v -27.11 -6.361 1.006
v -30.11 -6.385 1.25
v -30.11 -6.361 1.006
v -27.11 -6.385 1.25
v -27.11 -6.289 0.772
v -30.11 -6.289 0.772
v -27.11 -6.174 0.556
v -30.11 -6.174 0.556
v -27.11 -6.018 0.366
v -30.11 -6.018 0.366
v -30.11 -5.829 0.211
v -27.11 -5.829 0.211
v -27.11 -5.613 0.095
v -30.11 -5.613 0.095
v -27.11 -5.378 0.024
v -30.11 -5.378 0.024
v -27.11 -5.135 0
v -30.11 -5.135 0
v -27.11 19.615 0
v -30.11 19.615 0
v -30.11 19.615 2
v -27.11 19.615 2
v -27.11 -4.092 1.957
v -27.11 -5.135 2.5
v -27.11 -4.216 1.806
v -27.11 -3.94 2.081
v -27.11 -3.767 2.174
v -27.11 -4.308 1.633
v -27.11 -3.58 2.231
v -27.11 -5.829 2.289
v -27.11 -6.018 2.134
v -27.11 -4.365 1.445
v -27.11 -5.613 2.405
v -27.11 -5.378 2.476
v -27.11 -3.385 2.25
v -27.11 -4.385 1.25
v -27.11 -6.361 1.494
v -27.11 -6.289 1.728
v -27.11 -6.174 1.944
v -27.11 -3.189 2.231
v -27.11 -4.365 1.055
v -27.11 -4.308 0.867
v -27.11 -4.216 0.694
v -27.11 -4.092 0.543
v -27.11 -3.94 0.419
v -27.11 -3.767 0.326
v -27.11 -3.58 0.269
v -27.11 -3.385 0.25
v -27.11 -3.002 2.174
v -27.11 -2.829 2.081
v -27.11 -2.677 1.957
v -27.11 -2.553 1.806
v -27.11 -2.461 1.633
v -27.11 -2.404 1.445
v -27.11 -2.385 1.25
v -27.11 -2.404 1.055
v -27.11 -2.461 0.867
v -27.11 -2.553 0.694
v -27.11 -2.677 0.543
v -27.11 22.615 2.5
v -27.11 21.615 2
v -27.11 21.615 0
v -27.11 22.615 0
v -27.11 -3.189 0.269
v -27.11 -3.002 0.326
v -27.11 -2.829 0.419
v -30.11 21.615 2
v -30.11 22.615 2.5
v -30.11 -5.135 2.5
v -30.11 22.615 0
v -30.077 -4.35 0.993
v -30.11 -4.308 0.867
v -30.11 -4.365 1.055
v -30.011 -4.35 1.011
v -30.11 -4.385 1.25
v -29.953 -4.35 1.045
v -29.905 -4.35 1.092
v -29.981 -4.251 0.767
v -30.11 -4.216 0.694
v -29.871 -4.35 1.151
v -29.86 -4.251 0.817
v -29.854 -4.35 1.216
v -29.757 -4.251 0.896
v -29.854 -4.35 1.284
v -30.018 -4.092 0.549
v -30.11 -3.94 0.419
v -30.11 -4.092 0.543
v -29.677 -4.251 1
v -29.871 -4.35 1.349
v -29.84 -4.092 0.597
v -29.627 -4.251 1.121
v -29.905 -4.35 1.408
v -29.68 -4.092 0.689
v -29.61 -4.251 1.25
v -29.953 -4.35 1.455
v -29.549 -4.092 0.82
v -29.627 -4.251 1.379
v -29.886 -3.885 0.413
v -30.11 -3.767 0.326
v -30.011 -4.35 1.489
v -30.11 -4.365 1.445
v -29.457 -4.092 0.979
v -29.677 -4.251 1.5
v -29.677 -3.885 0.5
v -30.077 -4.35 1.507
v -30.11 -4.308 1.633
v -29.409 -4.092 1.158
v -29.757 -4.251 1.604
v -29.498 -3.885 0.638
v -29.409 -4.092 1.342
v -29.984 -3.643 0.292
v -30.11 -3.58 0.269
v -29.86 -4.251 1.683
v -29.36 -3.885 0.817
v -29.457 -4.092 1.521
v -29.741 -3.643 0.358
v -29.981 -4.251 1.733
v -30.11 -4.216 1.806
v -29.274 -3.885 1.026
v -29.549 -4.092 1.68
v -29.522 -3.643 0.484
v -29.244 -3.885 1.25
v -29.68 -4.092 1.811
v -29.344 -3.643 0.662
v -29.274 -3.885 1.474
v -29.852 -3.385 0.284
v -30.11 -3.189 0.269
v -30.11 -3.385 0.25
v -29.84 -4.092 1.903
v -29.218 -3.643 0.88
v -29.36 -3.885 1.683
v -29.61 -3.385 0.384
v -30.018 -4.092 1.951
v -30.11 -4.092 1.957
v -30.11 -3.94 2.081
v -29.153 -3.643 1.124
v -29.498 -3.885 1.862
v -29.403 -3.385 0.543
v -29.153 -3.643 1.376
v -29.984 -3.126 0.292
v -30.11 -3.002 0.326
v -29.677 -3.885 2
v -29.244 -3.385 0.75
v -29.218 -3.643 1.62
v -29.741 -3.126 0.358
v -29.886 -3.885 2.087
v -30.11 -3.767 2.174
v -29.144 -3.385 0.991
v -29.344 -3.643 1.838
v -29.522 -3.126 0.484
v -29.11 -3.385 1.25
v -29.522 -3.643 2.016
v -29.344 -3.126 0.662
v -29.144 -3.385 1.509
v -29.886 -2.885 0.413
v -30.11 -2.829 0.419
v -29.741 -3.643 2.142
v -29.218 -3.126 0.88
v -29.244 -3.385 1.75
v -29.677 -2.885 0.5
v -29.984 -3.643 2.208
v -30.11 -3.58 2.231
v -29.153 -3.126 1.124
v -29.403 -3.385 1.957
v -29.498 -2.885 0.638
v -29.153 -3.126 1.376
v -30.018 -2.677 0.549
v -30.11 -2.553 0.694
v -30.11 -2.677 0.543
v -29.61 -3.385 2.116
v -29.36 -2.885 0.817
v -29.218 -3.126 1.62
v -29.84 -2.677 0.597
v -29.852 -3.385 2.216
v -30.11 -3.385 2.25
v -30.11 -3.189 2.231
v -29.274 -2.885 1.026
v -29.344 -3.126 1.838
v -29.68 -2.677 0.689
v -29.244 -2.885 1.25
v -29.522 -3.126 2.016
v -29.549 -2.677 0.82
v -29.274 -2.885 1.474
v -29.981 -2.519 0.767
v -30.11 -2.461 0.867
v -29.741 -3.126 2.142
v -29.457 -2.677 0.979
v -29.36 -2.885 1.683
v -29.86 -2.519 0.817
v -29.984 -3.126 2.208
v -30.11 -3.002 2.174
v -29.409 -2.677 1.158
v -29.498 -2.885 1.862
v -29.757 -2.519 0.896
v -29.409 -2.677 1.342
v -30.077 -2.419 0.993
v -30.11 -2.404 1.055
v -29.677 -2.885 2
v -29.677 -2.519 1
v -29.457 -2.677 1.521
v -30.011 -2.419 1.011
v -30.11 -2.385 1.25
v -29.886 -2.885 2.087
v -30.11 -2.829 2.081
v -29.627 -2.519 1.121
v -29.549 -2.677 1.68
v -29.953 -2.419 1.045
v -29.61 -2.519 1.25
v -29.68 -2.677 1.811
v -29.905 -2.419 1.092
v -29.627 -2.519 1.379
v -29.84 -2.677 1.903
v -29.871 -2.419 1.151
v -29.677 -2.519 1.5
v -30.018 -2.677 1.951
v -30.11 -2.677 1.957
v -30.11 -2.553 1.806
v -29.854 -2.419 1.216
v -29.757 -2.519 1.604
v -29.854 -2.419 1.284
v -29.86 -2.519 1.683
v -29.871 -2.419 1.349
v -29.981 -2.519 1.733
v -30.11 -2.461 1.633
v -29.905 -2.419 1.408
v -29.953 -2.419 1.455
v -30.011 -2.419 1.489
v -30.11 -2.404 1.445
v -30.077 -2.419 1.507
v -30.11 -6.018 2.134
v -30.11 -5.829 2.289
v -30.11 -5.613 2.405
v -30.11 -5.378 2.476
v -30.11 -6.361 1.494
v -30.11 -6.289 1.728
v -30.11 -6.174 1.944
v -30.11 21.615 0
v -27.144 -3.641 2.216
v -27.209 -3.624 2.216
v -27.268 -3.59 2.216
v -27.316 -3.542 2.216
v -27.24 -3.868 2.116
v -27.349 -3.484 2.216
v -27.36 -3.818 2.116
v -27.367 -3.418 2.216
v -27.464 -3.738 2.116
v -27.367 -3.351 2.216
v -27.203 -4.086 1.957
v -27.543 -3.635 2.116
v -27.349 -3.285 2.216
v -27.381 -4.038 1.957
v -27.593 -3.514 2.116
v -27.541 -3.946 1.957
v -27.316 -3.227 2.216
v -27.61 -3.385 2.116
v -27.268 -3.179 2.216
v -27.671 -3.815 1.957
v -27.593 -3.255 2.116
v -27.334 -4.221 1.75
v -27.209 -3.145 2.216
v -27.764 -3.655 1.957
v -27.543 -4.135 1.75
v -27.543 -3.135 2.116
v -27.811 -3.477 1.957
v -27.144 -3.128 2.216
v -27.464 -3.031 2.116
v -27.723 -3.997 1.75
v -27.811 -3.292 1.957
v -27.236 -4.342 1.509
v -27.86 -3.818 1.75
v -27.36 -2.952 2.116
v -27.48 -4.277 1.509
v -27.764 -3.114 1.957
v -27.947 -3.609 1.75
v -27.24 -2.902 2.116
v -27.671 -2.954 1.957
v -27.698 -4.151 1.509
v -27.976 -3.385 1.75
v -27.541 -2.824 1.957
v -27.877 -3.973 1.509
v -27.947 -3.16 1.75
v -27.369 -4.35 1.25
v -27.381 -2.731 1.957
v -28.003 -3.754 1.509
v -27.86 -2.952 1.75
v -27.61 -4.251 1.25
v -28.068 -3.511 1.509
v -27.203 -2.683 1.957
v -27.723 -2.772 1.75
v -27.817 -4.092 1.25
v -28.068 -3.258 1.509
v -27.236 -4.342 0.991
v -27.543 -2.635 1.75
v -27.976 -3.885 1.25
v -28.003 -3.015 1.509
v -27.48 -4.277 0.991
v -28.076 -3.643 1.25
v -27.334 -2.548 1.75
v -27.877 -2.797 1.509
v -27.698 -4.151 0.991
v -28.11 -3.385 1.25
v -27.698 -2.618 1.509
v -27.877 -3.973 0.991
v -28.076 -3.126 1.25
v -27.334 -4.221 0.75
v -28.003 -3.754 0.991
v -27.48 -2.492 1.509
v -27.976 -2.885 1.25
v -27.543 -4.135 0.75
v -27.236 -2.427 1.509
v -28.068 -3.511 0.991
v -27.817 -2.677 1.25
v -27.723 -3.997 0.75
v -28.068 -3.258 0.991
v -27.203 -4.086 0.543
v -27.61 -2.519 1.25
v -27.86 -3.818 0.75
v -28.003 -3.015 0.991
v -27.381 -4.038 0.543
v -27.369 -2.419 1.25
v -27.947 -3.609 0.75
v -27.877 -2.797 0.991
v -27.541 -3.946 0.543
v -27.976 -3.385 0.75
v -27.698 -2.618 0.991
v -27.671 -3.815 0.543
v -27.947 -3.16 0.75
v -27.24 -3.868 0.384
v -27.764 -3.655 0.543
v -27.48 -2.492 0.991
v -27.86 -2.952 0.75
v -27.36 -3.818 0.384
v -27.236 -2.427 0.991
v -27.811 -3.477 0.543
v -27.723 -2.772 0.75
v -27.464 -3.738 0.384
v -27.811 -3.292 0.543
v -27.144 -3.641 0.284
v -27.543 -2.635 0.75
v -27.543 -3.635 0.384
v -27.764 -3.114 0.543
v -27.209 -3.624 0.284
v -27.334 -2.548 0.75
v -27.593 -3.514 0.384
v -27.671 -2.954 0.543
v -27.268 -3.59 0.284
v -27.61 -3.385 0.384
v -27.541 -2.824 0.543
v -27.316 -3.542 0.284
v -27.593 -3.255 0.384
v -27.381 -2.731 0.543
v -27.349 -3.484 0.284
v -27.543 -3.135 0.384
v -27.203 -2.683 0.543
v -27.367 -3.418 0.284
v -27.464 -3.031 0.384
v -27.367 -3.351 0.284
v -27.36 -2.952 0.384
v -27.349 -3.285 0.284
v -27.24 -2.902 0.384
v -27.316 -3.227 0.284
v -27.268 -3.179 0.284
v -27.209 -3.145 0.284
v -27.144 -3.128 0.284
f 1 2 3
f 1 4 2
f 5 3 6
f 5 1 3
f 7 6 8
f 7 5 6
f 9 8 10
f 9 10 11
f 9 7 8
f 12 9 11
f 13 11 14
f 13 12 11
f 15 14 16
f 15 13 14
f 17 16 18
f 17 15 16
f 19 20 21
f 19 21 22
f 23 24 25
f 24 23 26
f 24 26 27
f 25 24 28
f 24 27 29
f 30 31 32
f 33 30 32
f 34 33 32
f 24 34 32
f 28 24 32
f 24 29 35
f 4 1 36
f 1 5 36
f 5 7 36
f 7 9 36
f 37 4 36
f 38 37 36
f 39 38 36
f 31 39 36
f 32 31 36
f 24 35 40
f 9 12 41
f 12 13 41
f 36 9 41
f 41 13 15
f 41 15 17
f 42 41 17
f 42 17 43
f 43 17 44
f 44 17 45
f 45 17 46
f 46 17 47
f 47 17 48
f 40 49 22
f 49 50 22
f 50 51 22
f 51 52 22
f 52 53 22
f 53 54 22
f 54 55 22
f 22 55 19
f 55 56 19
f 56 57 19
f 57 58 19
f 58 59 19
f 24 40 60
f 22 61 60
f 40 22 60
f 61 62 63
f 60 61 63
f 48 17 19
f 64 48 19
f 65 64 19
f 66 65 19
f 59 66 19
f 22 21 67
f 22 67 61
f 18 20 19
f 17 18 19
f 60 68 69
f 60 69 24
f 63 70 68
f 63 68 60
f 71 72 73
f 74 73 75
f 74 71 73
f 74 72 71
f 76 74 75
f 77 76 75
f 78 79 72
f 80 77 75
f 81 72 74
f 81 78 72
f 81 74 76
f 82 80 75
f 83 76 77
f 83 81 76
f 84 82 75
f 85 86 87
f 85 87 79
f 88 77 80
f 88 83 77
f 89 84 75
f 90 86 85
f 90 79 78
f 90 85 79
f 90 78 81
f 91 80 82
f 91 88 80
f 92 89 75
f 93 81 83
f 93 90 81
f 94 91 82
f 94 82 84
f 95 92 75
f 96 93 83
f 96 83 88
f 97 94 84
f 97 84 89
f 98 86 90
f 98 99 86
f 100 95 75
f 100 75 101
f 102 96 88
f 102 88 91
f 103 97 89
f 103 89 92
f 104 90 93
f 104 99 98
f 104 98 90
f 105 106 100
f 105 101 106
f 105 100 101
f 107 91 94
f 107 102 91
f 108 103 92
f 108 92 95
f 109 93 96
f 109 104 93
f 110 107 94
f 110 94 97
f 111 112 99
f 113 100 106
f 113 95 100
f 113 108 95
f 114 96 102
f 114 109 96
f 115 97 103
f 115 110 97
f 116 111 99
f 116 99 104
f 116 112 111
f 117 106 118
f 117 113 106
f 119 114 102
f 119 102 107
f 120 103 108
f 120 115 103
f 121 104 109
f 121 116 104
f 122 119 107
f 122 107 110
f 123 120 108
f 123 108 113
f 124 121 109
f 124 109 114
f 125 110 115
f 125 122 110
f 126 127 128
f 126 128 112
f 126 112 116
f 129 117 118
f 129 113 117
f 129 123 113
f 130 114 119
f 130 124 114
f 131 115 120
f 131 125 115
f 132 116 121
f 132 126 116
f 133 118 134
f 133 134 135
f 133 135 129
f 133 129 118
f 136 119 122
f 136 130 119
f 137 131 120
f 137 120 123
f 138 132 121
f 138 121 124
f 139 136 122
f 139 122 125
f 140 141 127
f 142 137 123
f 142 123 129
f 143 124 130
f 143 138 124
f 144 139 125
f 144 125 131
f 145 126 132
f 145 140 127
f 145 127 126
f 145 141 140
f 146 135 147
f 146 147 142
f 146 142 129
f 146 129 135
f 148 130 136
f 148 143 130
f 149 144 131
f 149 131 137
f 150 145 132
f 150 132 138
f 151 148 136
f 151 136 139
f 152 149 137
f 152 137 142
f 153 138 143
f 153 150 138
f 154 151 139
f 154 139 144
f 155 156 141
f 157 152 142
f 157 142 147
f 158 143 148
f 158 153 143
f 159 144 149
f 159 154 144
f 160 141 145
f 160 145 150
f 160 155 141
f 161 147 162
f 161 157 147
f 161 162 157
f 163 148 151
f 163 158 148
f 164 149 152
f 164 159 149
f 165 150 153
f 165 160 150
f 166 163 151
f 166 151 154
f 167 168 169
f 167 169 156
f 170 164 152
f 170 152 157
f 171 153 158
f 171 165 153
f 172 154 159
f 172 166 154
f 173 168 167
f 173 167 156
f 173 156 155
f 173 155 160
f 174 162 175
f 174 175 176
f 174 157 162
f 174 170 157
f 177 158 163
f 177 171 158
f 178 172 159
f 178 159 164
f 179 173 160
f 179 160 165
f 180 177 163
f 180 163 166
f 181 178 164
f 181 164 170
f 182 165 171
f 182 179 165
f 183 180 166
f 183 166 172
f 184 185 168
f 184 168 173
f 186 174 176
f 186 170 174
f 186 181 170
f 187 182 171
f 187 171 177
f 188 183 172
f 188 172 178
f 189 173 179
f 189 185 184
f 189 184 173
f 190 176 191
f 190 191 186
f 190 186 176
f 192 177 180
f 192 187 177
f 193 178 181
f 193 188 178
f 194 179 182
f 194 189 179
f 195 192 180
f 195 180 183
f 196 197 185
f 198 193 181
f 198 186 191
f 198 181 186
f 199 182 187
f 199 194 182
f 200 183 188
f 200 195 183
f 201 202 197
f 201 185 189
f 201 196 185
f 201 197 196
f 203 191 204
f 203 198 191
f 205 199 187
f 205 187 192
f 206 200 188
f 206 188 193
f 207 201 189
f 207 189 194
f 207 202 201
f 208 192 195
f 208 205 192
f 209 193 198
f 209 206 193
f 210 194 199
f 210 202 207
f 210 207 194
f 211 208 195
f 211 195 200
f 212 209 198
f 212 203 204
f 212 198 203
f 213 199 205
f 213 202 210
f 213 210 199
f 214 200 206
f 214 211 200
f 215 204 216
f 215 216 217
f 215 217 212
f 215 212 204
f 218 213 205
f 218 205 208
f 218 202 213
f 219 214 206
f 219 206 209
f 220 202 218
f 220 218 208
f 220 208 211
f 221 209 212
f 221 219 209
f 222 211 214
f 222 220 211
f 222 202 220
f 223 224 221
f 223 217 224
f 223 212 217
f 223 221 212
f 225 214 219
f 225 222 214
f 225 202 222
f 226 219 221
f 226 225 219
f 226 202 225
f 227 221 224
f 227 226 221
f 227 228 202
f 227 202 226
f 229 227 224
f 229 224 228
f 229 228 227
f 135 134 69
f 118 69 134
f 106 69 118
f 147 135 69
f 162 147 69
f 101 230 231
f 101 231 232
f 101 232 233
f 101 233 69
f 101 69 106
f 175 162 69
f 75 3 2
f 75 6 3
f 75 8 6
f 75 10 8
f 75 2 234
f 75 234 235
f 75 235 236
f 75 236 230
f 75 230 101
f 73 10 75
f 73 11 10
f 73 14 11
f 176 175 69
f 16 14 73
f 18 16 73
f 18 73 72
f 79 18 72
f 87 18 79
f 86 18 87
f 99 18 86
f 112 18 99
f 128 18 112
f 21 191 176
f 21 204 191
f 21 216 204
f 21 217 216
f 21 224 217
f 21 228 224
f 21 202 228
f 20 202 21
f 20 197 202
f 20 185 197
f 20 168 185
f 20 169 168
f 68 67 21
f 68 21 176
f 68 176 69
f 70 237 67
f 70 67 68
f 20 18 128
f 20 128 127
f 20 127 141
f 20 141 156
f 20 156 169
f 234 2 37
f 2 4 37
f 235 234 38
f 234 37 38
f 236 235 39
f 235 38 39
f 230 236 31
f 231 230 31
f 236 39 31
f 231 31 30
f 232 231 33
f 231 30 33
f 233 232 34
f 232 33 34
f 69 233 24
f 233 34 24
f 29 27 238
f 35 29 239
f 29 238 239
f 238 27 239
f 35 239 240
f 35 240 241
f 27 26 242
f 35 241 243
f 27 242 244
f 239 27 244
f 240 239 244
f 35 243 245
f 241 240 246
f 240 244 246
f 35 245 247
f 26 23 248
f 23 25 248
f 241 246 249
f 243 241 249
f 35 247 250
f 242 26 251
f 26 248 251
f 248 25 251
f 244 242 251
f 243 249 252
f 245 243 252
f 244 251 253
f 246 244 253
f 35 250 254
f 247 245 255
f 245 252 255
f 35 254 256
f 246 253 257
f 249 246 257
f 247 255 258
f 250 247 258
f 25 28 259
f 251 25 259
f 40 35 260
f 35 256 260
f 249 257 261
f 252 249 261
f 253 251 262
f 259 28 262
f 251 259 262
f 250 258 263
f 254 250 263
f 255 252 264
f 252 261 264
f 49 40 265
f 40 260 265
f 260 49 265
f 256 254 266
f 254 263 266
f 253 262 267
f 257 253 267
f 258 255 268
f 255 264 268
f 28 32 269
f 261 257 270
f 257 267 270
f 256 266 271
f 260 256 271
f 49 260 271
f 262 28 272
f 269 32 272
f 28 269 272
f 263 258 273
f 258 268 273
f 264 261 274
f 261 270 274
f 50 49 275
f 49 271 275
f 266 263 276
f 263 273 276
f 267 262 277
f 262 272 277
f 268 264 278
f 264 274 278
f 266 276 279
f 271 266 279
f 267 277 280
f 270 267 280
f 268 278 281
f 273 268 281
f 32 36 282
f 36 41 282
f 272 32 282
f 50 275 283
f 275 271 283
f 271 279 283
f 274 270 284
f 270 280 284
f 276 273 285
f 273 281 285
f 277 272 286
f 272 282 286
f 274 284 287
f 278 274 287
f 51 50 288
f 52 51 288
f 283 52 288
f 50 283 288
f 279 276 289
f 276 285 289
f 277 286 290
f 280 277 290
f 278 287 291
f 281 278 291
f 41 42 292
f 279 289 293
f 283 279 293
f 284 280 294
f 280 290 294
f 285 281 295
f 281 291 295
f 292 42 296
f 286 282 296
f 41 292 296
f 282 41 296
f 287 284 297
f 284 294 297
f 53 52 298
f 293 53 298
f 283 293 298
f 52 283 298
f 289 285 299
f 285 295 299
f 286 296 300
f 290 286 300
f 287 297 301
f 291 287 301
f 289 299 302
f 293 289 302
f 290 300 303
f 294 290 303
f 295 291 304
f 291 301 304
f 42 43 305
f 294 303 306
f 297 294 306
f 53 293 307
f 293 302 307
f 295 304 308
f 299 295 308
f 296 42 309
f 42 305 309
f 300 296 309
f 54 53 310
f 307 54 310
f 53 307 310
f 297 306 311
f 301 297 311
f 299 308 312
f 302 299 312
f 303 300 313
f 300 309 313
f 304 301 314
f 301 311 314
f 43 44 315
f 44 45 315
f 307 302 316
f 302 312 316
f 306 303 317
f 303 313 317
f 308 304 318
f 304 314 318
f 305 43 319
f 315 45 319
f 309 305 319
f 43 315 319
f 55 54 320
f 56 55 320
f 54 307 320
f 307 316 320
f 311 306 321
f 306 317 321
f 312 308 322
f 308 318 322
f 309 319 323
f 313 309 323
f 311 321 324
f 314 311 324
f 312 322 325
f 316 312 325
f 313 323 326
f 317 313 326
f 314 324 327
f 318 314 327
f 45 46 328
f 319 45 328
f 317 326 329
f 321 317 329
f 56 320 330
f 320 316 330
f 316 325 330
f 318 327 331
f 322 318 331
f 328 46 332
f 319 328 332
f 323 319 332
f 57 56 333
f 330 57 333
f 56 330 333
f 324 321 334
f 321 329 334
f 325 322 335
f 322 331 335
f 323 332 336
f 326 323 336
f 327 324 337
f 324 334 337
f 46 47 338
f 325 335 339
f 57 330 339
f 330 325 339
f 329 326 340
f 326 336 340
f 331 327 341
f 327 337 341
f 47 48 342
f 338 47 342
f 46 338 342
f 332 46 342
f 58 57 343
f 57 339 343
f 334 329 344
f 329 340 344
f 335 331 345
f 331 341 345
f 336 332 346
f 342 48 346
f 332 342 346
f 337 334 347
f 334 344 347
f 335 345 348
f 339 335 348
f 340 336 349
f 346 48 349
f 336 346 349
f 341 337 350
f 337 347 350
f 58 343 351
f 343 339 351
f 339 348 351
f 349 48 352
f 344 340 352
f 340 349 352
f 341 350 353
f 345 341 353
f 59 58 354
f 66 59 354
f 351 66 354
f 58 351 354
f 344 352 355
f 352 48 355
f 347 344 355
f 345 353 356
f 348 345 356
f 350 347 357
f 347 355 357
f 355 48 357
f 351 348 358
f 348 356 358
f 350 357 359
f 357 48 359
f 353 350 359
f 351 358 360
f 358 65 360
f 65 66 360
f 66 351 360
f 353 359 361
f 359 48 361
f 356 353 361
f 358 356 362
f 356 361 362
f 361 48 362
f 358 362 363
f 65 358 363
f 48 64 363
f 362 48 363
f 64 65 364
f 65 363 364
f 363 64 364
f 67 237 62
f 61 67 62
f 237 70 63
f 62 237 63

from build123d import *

# Parameters (mm, degrees)
F0_W     = 3
F0_H     = 29
F1_DEPTH = 2.5
F6_R     = 1.24999
F7_W     = 3
F7_H     = 2
F8_DEPTH = 2


# Not quite as in the source:
# - a fillet or chamfer is up to 0.001 mm smaller than in the source, because OpenCascade refuses the exact size


with BuildPart() as f1:
    # F0 (on Top) → F1 (new body)
    with BuildSketch(Plane.XY):
        with Locations((-28.6103483079, 8.1154592335)):
            Rectangle(F0_W, F0_H)
    extrude(amount=F1_DEPTH)

    # F2 (on face) → F3 (revolve, cut)
    with BuildSketch(Plane.YZ.offset(-27.1103483079)):
        with BuildLine():
            Line((-3.3845407665, 0.25), (-3.3845407665, 2.25))
            ThreePointArc((-3.3845407665, 2.25), (-4.3845407665, 1.25), (-3.3845407665, 0.25))
        make_face()
    revolve(axis=Axis((-27.1103483079, -3.3845407665, 1.25), (0, 0, -1)), mode=Mode.SUBTRACT)

    # F4 (on face) → F5 (revolve, cut)
    with BuildSketch(Plane(origin=(-30.1103483079, 0, 0), x_dir=(0, -1, 0), z_dir=(-1, 0, 0))):
        with BuildLine():
            Line((2.3845407665, 1.25), (4.3845407665, 1.25))
            ThreePointArc((4.3845407665, 1.25), (3.3845407665, 2.25), (2.3845407665, 1.25))
        make_face()
    revolve(axis=Axis((-30.1103483079, -3.3845407665, 1.25), (0, -1, 0)), mode=Mode.SUBTRACT)

    # F6 (radius 1.25 in the source; OpenCascade refuses exactly that, so slightly less here)
    f6_edges = [f1.edges().sort_by_distance(p)[0] for p in [
        (-28.610348, -6.384541, 2.5),
        (-28.610348, -6.384541, 0),
    ]]
    fillet(f6_edges, radius=F6_R)

    # F7 (on face) → F8 (cut)
    with BuildSketch(Plane(origin=(0, 0, 0), x_dir=(1, 0, 0), z_dir=(0, 0, -1))):
        with Locations((-28.6103483079, -20.6154592335)):
            Rectangle(F7_W, F7_H)
    extrude(amount=-F8_DEPTH, mode=Mode.SUBTRACT)


solid = f1.part
